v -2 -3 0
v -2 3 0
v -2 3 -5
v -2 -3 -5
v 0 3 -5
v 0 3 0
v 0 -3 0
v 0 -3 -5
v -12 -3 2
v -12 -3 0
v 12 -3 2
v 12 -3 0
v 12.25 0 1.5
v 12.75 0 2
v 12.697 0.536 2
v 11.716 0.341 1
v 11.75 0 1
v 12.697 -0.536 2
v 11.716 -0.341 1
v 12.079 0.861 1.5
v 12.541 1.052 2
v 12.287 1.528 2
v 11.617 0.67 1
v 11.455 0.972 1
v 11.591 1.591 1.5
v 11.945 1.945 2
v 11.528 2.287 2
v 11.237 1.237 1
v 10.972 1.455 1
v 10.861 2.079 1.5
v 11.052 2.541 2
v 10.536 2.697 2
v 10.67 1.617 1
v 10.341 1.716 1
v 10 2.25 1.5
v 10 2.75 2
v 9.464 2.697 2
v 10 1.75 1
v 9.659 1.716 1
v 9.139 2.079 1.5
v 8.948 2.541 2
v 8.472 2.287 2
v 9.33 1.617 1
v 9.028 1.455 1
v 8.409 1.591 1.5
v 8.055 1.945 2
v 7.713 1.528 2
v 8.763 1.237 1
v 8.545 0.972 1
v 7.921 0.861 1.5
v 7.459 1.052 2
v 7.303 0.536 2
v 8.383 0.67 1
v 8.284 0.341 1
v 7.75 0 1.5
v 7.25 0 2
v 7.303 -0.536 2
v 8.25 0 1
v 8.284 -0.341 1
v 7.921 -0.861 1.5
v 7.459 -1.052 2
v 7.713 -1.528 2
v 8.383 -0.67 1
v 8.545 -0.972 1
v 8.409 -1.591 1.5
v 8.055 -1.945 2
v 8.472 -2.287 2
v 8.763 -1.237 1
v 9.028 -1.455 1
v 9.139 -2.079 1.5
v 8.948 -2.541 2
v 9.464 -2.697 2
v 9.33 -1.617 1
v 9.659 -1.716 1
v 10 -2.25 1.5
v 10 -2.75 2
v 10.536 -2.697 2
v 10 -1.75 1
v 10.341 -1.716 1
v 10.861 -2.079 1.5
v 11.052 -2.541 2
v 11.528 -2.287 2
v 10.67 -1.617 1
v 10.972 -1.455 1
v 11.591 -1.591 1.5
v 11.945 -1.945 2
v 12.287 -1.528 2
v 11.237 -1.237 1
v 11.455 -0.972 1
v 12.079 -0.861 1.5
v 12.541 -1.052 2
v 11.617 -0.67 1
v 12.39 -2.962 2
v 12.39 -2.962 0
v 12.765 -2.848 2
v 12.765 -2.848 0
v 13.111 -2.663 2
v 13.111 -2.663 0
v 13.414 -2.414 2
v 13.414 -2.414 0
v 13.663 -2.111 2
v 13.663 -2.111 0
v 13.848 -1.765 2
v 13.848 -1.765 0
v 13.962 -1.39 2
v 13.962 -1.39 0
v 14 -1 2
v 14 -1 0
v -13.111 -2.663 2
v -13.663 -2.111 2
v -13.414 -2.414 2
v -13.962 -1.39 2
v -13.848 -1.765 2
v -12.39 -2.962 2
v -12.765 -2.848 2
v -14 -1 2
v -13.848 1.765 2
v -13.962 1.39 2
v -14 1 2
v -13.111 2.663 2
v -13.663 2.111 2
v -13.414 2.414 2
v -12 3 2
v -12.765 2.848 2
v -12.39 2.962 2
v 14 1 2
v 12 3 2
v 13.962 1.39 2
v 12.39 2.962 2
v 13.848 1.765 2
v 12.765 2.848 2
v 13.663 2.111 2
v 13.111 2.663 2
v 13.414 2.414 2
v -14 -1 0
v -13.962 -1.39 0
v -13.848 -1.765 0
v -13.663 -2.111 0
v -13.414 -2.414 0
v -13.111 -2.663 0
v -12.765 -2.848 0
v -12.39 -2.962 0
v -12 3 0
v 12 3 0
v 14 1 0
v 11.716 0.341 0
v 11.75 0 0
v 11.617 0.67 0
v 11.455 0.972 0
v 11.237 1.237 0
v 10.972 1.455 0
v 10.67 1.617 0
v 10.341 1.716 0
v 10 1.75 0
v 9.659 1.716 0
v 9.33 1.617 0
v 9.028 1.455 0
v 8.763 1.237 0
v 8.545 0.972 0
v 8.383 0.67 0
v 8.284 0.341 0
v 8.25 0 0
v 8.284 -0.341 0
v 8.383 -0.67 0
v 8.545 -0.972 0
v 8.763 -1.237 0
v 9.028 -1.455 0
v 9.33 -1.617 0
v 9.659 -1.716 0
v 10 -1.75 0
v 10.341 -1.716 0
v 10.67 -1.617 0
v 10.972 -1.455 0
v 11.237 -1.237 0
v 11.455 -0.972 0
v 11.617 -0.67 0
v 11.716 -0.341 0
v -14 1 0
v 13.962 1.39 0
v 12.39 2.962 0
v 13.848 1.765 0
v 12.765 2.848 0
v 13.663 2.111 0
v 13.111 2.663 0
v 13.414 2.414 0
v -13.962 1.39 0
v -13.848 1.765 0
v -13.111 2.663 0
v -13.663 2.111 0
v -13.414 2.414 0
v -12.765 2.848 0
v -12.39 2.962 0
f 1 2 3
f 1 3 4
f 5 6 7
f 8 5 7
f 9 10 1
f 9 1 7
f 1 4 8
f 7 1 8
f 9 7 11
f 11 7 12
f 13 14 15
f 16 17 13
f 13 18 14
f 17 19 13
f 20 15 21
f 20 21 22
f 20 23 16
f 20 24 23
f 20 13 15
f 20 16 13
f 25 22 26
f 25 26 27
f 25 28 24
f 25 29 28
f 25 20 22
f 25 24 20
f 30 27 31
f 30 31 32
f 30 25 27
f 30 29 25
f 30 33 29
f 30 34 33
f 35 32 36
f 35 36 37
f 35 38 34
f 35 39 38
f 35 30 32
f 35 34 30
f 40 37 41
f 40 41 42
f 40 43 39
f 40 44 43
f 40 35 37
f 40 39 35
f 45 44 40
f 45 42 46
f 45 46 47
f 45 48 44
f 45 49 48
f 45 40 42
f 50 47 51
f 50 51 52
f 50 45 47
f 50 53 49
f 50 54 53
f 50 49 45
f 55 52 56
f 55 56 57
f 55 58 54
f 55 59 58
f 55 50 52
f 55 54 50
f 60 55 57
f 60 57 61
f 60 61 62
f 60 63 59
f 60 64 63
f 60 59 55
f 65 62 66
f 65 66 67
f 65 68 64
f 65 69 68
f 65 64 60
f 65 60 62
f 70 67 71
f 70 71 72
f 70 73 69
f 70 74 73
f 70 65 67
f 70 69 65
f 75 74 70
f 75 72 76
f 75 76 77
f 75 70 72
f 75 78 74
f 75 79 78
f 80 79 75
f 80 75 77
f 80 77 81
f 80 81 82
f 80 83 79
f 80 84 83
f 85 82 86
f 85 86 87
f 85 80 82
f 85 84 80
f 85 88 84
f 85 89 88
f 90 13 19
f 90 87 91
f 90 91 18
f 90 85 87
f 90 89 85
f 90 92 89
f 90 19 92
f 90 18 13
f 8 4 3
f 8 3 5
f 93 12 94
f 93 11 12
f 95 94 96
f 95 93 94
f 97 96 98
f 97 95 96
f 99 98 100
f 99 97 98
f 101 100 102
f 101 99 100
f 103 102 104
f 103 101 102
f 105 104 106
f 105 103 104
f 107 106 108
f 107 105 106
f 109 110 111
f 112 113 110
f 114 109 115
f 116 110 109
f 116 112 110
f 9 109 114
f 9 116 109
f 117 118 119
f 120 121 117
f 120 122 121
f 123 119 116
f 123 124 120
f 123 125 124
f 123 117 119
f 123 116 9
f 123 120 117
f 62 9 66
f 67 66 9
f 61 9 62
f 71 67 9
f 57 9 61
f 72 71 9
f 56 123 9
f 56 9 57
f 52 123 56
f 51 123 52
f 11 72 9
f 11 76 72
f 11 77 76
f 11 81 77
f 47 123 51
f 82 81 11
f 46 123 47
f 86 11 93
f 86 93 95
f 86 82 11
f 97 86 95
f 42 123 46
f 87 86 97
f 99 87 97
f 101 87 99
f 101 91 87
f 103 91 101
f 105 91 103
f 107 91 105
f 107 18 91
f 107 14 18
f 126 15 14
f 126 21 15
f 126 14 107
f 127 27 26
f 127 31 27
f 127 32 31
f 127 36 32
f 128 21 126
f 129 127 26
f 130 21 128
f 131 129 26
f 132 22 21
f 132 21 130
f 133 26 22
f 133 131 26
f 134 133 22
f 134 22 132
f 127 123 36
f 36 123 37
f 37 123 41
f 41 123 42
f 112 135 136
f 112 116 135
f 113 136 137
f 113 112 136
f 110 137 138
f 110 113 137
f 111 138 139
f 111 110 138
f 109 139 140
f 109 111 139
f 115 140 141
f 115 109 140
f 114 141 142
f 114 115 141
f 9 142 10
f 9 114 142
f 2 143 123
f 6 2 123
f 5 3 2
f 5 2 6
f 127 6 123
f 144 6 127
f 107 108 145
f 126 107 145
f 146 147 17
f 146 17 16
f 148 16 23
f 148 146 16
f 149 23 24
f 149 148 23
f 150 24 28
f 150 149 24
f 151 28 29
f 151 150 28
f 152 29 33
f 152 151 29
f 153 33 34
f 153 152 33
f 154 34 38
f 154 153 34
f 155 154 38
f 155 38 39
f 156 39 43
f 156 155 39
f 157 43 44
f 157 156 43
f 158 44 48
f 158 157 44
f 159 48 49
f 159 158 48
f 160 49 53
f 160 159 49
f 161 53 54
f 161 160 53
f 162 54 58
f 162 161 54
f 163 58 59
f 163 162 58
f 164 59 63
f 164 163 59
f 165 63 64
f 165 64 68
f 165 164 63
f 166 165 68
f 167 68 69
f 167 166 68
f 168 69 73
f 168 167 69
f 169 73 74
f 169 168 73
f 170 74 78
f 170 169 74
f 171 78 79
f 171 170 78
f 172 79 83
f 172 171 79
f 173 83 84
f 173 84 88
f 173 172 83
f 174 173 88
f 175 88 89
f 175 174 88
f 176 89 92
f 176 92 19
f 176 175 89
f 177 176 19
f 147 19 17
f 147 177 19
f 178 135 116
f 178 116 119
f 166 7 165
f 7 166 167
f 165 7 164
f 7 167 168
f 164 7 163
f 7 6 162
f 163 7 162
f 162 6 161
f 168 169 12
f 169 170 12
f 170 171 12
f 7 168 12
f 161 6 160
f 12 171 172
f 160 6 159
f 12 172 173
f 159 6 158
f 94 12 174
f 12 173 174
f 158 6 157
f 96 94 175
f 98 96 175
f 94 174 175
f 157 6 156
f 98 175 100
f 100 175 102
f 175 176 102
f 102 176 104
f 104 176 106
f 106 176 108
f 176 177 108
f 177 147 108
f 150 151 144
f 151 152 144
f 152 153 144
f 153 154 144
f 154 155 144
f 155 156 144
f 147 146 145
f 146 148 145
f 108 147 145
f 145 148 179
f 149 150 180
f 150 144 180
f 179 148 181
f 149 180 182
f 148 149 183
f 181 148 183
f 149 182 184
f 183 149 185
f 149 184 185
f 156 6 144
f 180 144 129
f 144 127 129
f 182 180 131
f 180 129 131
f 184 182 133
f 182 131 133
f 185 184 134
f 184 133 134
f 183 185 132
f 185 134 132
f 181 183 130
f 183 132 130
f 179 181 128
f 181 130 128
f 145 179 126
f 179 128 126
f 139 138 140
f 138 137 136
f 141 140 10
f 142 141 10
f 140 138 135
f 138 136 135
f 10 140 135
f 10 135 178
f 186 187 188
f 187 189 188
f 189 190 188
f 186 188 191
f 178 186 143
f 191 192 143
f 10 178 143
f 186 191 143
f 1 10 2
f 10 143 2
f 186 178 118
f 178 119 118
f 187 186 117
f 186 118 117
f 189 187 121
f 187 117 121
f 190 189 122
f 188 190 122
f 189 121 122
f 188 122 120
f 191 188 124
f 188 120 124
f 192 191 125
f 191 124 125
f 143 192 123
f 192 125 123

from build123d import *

# Parameters (mm, degrees)
F0_W     = 28
F0_H     = 6
F0_R     = 1.75
F1_DEPTH = 2
F2_W     = 2
F2_H     = 6
F3_DEPTH = 5
F4_SIZE  = 1
F5_R     = 2


with BuildPart() as f1:
    # F0 (on Top) → F1 (new body)
    with BuildSketch(Plane.XY):
        Rectangle(F0_W, F0_H)
        with Locations((10, 0)):
            Circle(F0_R, mode=Mode.SUBTRACT)
    extrude(amount=F1_DEPTH)

    # F2 (on face) → F3 (join)
    with BuildSketch(Plane(origin=(0, 0, 0), x_dir=(1, 0, 0), z_dir=(0, 0, -1))):
        with Locations((-1, 0)):
            Rectangle(F2_W, F2_H)
    extrude(amount=F3_DEPTH)

    # F4
    f4_edges = [f1.edges().sort_by_distance(p)[0] for p in [
        (8.25, 0, 2),
    ]]
    chamfer(f4_edges, length=F4_SIZE)

    # F5
    f5_edges = [f1.edges().sort_by_distance(p)[0] for p in [
        (14, -3, 1),
        (-14, -3, 1),
        (-14, 3, 1),
        (14, 3, 1),
    ]]
    fillet(f5_edges, radius=F5_R)


solid = f1.part
